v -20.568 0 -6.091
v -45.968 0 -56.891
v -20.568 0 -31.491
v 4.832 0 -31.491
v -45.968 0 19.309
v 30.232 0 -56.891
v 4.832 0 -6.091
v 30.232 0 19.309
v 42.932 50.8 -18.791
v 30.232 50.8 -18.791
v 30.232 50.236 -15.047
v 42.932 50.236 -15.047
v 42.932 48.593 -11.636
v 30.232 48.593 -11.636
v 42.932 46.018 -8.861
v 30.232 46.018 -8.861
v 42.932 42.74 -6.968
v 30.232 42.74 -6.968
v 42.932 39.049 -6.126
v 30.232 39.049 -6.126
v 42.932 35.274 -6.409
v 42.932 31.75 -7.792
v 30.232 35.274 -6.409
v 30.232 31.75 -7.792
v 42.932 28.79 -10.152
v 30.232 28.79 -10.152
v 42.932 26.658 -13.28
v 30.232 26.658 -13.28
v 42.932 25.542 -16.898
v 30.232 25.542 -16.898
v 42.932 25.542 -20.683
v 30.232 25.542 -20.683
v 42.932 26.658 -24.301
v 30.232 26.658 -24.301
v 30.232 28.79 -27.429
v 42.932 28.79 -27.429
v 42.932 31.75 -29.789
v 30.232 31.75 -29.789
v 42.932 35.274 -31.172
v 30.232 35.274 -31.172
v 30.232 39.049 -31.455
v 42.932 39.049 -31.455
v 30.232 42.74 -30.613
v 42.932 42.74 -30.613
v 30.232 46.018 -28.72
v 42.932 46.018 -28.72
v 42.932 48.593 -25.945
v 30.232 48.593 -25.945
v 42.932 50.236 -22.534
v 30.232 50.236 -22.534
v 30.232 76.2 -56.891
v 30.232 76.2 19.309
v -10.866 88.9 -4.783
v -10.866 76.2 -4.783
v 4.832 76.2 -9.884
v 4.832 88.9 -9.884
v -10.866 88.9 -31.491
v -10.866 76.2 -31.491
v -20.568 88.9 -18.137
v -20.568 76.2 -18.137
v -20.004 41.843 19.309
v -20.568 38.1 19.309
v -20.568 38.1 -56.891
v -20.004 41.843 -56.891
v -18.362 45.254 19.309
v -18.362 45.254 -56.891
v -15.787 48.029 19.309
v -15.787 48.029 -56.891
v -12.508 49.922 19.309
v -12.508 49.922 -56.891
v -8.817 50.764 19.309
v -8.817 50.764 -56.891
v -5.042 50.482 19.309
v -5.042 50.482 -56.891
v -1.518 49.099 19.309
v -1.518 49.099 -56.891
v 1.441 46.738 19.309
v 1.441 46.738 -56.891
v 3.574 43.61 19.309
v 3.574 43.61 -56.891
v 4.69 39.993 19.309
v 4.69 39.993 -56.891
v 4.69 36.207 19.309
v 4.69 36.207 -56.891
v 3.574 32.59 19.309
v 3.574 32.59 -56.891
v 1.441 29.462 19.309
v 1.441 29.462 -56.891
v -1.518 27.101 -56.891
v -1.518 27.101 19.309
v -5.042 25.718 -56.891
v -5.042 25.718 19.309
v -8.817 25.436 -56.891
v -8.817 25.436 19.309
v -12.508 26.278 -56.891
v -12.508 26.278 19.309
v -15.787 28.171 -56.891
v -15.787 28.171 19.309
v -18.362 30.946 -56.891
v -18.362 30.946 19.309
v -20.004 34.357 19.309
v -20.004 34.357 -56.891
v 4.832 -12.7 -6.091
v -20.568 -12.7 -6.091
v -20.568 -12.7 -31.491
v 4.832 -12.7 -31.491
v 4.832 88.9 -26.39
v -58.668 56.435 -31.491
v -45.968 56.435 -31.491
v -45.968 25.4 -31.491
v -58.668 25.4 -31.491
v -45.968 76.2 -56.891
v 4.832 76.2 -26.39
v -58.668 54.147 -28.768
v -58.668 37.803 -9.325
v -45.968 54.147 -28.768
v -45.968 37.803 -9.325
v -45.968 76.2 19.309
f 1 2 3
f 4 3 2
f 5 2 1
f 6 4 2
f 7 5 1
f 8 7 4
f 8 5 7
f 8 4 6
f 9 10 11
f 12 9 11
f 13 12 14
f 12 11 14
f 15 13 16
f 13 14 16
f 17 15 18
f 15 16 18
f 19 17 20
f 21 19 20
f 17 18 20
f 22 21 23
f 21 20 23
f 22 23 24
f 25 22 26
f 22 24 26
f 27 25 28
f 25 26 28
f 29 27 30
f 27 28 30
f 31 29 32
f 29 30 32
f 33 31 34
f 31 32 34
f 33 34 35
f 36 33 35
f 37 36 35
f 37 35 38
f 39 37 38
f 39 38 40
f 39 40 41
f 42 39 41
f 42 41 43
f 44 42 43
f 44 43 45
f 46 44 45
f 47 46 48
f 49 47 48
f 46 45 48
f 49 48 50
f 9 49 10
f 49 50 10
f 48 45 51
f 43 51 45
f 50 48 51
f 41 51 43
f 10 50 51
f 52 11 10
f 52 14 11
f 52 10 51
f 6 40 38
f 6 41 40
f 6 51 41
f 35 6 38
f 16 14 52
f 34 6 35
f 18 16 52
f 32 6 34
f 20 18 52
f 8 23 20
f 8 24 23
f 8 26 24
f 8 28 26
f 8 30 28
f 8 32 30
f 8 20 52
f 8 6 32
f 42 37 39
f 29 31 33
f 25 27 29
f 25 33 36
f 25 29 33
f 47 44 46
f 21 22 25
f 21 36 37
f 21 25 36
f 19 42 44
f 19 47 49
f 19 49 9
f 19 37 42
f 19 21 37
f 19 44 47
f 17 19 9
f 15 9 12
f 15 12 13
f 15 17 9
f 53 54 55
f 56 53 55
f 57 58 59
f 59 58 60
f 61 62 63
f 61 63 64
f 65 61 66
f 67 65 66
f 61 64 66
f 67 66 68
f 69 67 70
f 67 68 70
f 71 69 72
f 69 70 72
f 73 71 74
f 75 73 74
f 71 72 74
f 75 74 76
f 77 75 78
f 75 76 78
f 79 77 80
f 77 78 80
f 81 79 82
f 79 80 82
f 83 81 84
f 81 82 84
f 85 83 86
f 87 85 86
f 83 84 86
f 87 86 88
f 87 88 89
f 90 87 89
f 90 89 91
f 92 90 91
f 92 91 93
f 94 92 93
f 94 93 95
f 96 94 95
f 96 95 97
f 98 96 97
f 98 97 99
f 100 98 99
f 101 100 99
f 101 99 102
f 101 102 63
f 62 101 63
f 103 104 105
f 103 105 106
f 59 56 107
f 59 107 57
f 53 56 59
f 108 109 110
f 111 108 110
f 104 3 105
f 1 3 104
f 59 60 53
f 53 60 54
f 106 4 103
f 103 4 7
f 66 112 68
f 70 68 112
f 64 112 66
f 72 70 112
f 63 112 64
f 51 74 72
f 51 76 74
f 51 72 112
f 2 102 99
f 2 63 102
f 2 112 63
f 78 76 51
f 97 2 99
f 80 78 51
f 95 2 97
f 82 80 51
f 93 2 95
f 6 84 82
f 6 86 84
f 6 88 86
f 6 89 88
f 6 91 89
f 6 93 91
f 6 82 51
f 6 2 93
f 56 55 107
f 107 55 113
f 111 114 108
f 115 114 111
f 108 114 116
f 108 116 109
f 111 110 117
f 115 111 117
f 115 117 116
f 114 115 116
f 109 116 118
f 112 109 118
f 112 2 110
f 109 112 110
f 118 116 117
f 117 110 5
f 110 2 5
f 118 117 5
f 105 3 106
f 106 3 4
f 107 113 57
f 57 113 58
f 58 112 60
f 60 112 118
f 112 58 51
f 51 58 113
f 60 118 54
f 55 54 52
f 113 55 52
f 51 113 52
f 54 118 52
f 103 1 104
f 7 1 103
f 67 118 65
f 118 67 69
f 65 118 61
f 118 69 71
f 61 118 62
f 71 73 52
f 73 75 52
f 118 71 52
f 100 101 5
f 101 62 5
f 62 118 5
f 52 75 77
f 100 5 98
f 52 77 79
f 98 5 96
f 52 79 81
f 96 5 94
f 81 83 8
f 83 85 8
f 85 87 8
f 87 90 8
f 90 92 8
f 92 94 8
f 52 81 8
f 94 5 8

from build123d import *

# Parameters (mm, degrees)
F0_W      = 76.2
F0_H      = 76.2
F1_DEPTH  = 76.2
F2_W      = 25.4
F2_H      = 25.4
F3_DEPTH  = 12.7
F4_R      = 12.7
F5_DEPTH  = 12.7
F7_D      = 25.4
F9_DEPTH  = 12.7
F11_DEPTH = 12.7


with BuildPart() as f1:
    # F0 (on Front) → F1 (new body)
    with BuildSketch(Plane.XZ):
        with Locations((-7.868283, -18.790566)):
            Rectangle(F0_W, F0_H)
    extrude(amount=-F1_DEPTH)

    # F2 (on face) → F3 (join)
    with BuildSketch(Plane.XZ):
        with Locations((-7.868283, -18.790566)):
            Rectangle(F2_W, F2_H)
    extrude(amount=F3_DEPTH)

    # F4 (on face) → F5 (join)
    with BuildSketch(Plane.YZ.offset(30.231717)):
        with Locations((38.1, -18.790566)):
            Circle(F4_R)
    extrude(amount=F5_DEPTH)

    # F7 (through all)
    with Locations(Plane.XY.offset(19.309434)):
        with Locations((-7.868283, 38.1)):
            Hole(F7_D / 2)

    # F8 (on face) → F9 (join)
    with BuildSketch(Plane(origin=(-45.968283, 0, 0), x_dir=(0, -1, 0), z_dir=(-1, 0, 0))):
        Polygon((-25.4, -31.490566), (-37.803471, -9.324964), (-54.146989, -28.768456), (-56.435099, -31.490566), align=None)
    extrude(amount=F9_DEPTH)

    # F10 (on face) → F11 (join)
    with BuildSketch(Plane(origin=(0, 76.2, 0), x_dir=(-1, 0, 0), z_dir=(0, 1, 0))):
        Polygon((-4.831717, -9.884035), (-4.831717, -26.389956), (10.866347, -31.490566), (20.568283, -18.136995), (10.866347, -4.783425), align=None)
    extrude(amount=F11_DEPTH)


solid = f1.part
